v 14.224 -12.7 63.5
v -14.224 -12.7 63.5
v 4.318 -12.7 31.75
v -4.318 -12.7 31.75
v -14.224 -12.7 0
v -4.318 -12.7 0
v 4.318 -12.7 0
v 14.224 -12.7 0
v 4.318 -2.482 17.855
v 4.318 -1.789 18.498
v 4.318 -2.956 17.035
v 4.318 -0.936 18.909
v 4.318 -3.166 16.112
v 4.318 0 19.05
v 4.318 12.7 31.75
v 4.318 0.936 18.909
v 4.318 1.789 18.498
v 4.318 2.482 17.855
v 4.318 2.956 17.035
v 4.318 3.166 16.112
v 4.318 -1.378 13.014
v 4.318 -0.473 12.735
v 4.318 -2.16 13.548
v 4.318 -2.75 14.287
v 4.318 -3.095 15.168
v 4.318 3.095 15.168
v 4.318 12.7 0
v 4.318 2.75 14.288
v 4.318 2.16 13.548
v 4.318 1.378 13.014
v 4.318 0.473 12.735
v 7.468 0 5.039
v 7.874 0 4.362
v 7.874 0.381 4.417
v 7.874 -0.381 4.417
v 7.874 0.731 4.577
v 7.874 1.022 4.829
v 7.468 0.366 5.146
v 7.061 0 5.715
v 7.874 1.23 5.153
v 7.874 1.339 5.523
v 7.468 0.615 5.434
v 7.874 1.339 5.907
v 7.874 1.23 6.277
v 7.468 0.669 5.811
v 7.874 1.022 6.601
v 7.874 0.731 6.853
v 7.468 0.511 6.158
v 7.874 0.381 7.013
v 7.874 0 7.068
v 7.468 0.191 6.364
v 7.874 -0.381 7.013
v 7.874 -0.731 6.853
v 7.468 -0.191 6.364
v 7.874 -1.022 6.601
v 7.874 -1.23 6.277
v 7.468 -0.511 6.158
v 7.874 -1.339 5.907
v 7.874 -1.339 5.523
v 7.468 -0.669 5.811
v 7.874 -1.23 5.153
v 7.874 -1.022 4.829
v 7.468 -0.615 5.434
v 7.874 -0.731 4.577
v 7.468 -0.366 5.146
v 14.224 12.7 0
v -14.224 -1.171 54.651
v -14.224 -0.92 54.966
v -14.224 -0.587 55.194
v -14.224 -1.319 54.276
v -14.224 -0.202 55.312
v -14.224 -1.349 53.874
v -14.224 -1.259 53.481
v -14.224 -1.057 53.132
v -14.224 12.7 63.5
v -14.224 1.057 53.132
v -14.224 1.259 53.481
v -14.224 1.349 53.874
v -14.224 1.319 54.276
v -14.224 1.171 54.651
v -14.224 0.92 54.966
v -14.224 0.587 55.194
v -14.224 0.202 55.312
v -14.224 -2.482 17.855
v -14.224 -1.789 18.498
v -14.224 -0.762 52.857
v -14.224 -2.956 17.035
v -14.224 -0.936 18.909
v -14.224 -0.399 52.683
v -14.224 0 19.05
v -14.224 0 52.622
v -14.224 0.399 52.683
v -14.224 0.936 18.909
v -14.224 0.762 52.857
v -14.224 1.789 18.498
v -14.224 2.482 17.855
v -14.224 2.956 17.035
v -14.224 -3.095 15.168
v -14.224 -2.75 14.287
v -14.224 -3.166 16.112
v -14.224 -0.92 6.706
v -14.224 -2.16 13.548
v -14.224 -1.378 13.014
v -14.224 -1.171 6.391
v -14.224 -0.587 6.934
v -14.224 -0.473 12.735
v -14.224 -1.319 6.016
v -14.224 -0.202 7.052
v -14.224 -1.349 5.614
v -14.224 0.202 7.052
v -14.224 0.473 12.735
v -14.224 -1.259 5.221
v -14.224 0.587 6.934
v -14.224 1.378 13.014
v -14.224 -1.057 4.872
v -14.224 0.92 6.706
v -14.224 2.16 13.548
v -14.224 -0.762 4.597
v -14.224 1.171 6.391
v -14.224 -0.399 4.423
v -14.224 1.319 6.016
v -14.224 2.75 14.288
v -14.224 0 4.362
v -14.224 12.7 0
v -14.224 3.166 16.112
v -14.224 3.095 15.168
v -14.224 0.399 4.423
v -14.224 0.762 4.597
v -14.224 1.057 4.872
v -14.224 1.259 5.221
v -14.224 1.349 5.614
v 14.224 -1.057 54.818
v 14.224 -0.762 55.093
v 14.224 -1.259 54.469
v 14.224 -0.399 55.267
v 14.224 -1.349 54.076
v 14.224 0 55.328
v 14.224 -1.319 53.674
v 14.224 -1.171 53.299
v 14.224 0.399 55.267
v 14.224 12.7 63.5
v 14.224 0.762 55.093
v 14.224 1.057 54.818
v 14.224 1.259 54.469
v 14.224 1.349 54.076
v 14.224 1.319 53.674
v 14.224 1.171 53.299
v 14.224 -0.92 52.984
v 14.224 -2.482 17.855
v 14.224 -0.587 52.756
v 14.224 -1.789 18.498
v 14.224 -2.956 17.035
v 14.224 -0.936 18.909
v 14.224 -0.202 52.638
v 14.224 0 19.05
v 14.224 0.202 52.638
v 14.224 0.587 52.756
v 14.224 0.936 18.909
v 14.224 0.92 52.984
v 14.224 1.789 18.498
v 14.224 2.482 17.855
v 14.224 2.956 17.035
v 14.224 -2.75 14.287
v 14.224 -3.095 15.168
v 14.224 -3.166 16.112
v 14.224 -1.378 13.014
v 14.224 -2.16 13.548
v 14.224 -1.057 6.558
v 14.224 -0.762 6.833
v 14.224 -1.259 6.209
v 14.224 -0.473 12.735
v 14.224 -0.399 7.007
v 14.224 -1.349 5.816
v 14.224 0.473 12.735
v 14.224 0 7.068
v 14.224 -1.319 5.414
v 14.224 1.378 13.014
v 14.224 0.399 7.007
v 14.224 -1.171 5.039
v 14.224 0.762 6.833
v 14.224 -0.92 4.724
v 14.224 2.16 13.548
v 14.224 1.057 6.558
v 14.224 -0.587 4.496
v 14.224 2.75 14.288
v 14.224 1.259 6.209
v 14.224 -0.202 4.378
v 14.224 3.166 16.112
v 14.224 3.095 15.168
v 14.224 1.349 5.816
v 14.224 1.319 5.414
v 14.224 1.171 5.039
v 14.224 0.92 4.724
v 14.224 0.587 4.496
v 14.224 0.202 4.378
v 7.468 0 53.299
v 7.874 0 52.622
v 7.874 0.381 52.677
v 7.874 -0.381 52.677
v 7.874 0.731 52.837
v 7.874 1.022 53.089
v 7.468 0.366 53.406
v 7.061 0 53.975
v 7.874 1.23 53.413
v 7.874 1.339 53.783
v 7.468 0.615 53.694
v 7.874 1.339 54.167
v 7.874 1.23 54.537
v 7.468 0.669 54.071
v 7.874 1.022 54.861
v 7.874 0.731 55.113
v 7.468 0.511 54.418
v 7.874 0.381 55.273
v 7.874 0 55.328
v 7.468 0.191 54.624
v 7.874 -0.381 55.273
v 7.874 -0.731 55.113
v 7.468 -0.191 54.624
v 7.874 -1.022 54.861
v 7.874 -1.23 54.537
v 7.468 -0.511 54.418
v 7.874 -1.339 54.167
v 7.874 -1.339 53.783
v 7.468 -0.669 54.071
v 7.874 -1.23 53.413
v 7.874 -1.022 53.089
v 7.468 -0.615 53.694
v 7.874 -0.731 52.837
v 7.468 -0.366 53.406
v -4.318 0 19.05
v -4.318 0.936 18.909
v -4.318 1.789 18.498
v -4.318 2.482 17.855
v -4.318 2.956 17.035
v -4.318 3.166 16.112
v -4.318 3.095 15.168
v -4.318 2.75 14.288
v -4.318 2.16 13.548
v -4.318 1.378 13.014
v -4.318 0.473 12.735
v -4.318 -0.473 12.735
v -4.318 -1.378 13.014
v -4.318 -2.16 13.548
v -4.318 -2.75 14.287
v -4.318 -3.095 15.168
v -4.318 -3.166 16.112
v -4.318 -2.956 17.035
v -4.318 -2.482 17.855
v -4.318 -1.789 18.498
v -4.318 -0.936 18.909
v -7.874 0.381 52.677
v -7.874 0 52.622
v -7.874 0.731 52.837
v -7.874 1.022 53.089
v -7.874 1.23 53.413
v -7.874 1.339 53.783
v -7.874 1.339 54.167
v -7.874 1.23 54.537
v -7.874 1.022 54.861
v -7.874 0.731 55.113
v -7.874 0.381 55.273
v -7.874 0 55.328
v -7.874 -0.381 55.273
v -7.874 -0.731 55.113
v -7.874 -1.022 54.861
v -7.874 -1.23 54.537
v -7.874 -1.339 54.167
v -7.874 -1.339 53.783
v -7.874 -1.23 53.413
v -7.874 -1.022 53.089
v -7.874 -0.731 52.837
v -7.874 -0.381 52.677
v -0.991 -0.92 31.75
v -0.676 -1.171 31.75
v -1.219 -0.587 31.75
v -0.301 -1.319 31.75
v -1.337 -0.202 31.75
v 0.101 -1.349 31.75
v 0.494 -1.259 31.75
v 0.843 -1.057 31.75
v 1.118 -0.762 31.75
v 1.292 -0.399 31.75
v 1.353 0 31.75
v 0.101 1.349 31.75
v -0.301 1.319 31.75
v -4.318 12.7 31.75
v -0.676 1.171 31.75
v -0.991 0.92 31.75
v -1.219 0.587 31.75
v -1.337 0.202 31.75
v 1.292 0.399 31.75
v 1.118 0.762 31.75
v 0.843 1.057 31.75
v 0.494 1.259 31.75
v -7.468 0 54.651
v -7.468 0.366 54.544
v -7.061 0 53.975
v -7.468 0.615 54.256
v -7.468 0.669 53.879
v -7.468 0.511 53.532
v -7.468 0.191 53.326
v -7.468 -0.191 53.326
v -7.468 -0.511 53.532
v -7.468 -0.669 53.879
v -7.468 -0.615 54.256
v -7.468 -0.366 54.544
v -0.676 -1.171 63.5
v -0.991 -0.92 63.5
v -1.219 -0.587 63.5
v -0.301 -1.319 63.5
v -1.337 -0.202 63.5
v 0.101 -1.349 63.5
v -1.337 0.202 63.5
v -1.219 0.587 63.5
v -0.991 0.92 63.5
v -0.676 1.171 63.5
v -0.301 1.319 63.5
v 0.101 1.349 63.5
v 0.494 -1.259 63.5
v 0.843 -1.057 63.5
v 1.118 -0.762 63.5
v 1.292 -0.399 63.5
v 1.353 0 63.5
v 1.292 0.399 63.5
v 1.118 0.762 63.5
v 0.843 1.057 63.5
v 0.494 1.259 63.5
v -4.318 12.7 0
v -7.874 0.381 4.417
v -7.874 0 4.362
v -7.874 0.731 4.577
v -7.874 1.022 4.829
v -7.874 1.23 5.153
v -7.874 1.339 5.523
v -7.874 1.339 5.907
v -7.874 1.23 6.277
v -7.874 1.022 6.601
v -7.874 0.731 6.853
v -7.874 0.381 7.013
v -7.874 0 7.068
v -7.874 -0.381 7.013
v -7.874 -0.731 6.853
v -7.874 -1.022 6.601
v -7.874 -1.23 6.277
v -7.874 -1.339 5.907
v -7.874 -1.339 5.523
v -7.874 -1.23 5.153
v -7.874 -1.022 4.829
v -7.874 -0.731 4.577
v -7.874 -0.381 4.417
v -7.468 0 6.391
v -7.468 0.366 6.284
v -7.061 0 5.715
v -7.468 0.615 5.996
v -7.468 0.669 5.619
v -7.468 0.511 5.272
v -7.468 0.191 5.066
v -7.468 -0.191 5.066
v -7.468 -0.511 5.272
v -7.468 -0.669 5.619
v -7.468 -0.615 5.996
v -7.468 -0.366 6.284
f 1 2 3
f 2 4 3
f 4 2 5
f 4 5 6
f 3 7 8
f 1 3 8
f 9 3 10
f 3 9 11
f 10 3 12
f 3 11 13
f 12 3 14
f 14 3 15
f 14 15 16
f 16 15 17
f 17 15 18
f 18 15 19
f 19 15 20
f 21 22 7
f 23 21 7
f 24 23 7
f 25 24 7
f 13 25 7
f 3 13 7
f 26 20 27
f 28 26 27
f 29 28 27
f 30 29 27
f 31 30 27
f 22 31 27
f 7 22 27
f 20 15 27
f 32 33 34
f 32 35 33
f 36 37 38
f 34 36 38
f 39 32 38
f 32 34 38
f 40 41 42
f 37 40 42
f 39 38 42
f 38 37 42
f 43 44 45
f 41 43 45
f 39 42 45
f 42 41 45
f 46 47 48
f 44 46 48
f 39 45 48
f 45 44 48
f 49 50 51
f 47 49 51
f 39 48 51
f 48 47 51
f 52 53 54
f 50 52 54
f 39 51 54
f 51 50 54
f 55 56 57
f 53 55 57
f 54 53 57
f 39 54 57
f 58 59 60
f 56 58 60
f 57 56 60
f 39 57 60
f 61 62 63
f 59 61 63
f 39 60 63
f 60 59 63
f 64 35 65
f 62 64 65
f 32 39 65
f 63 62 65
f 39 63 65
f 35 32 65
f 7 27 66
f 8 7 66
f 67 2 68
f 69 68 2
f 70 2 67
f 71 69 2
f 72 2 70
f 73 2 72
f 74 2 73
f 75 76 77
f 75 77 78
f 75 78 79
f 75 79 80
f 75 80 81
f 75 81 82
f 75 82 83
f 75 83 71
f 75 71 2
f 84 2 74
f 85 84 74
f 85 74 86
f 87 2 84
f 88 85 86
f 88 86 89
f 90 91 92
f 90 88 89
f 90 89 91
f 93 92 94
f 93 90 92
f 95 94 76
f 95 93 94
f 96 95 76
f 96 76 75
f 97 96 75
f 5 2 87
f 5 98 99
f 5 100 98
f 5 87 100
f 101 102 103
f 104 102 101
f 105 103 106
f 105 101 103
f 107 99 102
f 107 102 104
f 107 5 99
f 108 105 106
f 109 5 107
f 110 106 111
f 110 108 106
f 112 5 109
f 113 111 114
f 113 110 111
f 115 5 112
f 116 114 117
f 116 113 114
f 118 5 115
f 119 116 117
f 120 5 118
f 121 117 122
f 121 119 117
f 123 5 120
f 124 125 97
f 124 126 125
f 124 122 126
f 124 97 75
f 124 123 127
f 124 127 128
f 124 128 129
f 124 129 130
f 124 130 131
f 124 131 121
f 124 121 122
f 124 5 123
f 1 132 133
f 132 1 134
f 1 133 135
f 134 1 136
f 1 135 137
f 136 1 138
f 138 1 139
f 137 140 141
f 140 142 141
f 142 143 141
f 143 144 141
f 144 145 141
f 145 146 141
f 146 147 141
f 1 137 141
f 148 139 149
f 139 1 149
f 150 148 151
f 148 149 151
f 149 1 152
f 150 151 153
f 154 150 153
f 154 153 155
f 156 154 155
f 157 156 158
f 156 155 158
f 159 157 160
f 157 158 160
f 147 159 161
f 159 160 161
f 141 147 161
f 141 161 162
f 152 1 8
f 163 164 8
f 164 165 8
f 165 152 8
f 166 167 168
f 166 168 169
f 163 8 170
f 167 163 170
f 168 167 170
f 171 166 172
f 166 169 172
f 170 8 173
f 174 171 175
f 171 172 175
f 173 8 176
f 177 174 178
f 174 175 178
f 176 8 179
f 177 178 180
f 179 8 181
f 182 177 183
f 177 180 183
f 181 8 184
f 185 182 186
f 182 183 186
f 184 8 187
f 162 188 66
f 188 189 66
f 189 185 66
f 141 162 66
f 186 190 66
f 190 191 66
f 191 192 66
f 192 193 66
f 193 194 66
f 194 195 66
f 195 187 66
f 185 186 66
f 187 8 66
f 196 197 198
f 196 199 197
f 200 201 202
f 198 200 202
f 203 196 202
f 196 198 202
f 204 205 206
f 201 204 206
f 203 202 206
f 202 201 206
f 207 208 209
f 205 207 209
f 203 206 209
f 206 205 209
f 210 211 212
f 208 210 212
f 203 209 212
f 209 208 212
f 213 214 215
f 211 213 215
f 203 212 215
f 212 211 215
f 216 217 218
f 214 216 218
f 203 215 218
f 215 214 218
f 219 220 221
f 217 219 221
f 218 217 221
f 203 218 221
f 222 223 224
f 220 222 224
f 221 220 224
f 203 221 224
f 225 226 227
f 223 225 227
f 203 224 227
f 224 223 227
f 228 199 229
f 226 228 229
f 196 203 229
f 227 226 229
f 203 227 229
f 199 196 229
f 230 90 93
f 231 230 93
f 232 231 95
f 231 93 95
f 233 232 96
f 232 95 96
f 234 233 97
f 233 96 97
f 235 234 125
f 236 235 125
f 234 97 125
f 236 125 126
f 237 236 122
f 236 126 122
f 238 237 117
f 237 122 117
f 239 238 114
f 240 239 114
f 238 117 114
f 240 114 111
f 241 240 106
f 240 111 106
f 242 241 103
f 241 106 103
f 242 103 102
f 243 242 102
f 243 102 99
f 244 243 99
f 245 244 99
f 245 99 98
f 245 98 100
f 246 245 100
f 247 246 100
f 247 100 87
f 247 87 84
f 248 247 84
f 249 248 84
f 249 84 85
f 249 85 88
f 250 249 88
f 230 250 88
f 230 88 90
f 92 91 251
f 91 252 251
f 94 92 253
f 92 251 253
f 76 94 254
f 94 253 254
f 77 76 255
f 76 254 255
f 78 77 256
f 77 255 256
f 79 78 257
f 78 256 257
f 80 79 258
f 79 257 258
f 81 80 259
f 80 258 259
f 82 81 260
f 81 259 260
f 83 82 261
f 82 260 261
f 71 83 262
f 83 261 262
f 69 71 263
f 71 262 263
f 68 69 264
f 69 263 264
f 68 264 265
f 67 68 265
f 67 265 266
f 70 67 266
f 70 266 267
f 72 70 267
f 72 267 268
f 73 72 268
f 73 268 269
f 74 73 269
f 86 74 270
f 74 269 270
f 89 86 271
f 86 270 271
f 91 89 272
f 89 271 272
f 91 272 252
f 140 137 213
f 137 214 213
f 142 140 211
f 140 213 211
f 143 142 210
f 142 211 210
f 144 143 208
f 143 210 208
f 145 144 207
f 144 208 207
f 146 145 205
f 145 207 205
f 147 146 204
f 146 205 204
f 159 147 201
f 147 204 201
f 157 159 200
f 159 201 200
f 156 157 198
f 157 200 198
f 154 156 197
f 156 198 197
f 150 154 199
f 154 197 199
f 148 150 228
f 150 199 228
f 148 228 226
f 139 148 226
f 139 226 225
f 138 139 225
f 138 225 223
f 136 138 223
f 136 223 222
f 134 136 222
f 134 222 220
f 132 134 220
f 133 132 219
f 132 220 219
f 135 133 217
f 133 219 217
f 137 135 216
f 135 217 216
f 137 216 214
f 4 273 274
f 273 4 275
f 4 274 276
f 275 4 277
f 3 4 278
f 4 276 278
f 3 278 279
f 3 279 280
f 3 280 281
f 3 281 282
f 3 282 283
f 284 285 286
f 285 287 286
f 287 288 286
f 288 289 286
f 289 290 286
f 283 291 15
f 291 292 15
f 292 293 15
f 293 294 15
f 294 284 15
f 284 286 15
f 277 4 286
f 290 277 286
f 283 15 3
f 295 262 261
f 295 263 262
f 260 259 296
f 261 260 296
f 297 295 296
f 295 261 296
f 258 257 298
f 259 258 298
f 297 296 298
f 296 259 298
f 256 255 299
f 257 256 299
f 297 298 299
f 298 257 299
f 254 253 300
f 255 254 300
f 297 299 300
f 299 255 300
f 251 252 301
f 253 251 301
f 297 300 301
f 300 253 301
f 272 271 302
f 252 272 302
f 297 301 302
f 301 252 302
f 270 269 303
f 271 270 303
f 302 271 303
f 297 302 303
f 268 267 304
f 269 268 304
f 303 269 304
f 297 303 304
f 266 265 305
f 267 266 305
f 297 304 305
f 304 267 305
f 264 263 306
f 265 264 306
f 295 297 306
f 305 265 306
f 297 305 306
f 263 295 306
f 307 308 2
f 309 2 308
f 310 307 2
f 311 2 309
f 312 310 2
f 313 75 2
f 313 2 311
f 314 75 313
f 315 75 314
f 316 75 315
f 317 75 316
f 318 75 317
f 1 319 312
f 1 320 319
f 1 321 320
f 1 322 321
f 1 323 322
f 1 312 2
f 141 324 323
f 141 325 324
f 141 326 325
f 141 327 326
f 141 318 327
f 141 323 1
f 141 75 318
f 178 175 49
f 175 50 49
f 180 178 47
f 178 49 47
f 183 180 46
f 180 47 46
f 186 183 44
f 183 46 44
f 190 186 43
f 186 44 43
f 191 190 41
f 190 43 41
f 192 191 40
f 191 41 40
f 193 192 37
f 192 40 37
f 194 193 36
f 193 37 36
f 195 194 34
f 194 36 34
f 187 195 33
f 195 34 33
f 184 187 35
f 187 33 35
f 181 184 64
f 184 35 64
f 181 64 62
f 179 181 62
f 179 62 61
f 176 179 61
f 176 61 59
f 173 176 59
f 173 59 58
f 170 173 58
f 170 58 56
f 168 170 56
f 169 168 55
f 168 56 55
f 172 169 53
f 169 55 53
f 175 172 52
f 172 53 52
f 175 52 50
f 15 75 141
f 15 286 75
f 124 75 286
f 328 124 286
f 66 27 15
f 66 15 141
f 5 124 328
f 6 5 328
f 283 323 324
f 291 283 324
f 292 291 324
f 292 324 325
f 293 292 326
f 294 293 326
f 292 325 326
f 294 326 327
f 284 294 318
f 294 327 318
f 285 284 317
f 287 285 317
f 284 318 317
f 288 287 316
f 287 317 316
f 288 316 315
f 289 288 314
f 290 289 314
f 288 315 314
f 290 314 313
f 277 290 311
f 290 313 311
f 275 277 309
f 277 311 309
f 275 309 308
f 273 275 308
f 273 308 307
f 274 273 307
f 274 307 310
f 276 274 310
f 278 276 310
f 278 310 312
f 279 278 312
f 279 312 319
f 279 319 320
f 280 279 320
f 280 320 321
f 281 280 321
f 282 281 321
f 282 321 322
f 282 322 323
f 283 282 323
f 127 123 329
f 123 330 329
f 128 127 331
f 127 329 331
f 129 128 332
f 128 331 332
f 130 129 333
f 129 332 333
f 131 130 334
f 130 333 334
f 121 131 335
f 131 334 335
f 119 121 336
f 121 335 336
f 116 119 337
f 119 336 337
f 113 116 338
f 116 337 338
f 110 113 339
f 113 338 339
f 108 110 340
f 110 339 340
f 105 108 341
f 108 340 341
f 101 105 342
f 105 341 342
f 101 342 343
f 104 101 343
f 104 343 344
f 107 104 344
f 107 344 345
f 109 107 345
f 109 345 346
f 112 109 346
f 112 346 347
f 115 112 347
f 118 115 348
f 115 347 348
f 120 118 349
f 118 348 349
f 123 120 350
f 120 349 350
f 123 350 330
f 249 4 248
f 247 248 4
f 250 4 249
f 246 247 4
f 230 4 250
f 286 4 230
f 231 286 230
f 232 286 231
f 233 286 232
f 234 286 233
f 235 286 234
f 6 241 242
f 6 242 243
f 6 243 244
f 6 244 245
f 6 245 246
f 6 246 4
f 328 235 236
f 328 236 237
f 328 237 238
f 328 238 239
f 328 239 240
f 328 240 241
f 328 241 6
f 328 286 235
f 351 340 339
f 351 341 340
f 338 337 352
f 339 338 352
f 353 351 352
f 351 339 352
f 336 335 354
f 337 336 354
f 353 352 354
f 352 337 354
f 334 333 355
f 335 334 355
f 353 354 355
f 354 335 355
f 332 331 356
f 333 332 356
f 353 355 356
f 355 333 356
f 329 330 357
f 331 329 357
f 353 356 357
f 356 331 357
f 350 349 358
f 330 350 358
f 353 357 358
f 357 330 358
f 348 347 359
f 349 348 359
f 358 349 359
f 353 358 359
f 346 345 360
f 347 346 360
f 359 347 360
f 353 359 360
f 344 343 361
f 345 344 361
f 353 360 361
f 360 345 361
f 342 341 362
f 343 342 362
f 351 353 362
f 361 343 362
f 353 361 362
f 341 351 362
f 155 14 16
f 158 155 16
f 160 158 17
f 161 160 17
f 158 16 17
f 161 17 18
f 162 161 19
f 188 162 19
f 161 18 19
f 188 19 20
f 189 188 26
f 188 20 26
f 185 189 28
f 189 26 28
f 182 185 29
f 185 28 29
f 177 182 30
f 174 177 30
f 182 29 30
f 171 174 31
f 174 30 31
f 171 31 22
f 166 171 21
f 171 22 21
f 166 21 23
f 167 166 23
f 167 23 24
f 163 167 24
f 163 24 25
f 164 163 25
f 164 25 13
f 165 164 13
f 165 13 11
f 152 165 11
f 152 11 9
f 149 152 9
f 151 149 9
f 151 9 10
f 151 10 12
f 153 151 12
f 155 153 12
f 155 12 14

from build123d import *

# Parameters (mm, degrees)
SKETCH1_W                 = 28.448
SKETCH1_H                 = 25.4
BOSS_EXTRUDE1_DEPTH       = 63.5
SKETCH2_W                 = 8.636
SKETCH2_H                 = 31.75
CUT_EXTRUDE1_DEPTH        = 70.855079815
SKETCH3_R                 = 3.175
CUT_EXTRUDE3_DEPTH        = 71.730677248
F_6_32_TAPPED_HOLE1_D     = 2.7051
F_6_32_TAPPED_HOLE1_DEPTH = 6.35
F_6_32_TAPPED_HOLE1_TIP   = 0.81269403
F_6_32_TAPPED_HOLE2_D     = 2.7051
F_6_32_TAPPED_HOLE2_DEPTH = 6.35
F_6_32_TAPPED_HOLE2_TIP   = 0.81269403
F_6_32_TAPPED_HOLE3_D     = 2.7051


with BuildPart() as part:
    # Sketch1 → Boss-Extrude1 (new body)
    with BuildSketch(Plane.XY):
        Rectangle(SKETCH1_W, SKETCH1_H)
    extrude(amount=BOSS_EXTRUDE1_DEPTH)

    # Sketch2 → Cut-Extrude1 (cut, through all)
    with BuildSketch(Plane(origin=(0, 12.7, 0), x_dir=(1, 0, 0), z_dir=(0, 1, 0))):
        with Locations((0, -15.875)):
            Rectangle(SKETCH2_W, SKETCH2_H)
    extrude(amount=-CUT_EXTRUDE1_DEPTH, mode=Mode.SUBTRACT)

    # Sketch3 → Cut-Extrude3 (cut, through all)
    with BuildSketch(Plane.ZY.offset(14.224)):
        with Locations((15.875, 0)):
            Circle(SKETCH3_R)
    extrude(amount=-CUT_EXTRUDE3_DEPTH, mode=Mode.SUBTRACT)

    # #6-32 Tapped Hole1
    with Locations(Plane.ZY.offset(14.224)):
        with Locations((5.715, 0), (53.975, 0)):
            Hole(F_6_32_TAPPED_HOLE1_D / 2, depth=F_6_32_TAPPED_HOLE1_DEPTH)
            with Locations((0, 0, -(F_6_32_TAPPED_HOLE1_DEPTH + F_6_32_TAPPED_HOLE1_TIP / 2))):  # 118° drill point
                Cone(0, F_6_32_TAPPED_HOLE1_D / 2, F_6_32_TAPPED_HOLE1_TIP, mode=Mode.SUBTRACT)

    # #6-32 Tapped Hole2
    with Locations(Plane(origin=(14.224, 0, 0), x_dir=(0, 0, -1), z_dir=(1, 0, 0))):
        with Locations((-53.975, 0), (-5.715, 0)):
            Hole(F_6_32_TAPPED_HOLE2_D / 2, depth=F_6_32_TAPPED_HOLE2_DEPTH)
            with Locations((0, 0, -(F_6_32_TAPPED_HOLE2_DEPTH + F_6_32_TAPPED_HOLE2_TIP / 2))):  # 118° drill point
                Cone(0, F_6_32_TAPPED_HOLE2_D / 2, F_6_32_TAPPED_HOLE2_TIP, mode=Mode.SUBTRACT)

    # #6-32 Tapped Hole3 (through all)
    with Locations(Plane(origin=(0, 0, 31.75), x_dir=(-1, 0, 0), z_dir=(0, 0, -1))):
        with Locations((0, 0)):
            Hole(F_6_32_TAPPED_HOLE3_D / 2)


solid = part.part
